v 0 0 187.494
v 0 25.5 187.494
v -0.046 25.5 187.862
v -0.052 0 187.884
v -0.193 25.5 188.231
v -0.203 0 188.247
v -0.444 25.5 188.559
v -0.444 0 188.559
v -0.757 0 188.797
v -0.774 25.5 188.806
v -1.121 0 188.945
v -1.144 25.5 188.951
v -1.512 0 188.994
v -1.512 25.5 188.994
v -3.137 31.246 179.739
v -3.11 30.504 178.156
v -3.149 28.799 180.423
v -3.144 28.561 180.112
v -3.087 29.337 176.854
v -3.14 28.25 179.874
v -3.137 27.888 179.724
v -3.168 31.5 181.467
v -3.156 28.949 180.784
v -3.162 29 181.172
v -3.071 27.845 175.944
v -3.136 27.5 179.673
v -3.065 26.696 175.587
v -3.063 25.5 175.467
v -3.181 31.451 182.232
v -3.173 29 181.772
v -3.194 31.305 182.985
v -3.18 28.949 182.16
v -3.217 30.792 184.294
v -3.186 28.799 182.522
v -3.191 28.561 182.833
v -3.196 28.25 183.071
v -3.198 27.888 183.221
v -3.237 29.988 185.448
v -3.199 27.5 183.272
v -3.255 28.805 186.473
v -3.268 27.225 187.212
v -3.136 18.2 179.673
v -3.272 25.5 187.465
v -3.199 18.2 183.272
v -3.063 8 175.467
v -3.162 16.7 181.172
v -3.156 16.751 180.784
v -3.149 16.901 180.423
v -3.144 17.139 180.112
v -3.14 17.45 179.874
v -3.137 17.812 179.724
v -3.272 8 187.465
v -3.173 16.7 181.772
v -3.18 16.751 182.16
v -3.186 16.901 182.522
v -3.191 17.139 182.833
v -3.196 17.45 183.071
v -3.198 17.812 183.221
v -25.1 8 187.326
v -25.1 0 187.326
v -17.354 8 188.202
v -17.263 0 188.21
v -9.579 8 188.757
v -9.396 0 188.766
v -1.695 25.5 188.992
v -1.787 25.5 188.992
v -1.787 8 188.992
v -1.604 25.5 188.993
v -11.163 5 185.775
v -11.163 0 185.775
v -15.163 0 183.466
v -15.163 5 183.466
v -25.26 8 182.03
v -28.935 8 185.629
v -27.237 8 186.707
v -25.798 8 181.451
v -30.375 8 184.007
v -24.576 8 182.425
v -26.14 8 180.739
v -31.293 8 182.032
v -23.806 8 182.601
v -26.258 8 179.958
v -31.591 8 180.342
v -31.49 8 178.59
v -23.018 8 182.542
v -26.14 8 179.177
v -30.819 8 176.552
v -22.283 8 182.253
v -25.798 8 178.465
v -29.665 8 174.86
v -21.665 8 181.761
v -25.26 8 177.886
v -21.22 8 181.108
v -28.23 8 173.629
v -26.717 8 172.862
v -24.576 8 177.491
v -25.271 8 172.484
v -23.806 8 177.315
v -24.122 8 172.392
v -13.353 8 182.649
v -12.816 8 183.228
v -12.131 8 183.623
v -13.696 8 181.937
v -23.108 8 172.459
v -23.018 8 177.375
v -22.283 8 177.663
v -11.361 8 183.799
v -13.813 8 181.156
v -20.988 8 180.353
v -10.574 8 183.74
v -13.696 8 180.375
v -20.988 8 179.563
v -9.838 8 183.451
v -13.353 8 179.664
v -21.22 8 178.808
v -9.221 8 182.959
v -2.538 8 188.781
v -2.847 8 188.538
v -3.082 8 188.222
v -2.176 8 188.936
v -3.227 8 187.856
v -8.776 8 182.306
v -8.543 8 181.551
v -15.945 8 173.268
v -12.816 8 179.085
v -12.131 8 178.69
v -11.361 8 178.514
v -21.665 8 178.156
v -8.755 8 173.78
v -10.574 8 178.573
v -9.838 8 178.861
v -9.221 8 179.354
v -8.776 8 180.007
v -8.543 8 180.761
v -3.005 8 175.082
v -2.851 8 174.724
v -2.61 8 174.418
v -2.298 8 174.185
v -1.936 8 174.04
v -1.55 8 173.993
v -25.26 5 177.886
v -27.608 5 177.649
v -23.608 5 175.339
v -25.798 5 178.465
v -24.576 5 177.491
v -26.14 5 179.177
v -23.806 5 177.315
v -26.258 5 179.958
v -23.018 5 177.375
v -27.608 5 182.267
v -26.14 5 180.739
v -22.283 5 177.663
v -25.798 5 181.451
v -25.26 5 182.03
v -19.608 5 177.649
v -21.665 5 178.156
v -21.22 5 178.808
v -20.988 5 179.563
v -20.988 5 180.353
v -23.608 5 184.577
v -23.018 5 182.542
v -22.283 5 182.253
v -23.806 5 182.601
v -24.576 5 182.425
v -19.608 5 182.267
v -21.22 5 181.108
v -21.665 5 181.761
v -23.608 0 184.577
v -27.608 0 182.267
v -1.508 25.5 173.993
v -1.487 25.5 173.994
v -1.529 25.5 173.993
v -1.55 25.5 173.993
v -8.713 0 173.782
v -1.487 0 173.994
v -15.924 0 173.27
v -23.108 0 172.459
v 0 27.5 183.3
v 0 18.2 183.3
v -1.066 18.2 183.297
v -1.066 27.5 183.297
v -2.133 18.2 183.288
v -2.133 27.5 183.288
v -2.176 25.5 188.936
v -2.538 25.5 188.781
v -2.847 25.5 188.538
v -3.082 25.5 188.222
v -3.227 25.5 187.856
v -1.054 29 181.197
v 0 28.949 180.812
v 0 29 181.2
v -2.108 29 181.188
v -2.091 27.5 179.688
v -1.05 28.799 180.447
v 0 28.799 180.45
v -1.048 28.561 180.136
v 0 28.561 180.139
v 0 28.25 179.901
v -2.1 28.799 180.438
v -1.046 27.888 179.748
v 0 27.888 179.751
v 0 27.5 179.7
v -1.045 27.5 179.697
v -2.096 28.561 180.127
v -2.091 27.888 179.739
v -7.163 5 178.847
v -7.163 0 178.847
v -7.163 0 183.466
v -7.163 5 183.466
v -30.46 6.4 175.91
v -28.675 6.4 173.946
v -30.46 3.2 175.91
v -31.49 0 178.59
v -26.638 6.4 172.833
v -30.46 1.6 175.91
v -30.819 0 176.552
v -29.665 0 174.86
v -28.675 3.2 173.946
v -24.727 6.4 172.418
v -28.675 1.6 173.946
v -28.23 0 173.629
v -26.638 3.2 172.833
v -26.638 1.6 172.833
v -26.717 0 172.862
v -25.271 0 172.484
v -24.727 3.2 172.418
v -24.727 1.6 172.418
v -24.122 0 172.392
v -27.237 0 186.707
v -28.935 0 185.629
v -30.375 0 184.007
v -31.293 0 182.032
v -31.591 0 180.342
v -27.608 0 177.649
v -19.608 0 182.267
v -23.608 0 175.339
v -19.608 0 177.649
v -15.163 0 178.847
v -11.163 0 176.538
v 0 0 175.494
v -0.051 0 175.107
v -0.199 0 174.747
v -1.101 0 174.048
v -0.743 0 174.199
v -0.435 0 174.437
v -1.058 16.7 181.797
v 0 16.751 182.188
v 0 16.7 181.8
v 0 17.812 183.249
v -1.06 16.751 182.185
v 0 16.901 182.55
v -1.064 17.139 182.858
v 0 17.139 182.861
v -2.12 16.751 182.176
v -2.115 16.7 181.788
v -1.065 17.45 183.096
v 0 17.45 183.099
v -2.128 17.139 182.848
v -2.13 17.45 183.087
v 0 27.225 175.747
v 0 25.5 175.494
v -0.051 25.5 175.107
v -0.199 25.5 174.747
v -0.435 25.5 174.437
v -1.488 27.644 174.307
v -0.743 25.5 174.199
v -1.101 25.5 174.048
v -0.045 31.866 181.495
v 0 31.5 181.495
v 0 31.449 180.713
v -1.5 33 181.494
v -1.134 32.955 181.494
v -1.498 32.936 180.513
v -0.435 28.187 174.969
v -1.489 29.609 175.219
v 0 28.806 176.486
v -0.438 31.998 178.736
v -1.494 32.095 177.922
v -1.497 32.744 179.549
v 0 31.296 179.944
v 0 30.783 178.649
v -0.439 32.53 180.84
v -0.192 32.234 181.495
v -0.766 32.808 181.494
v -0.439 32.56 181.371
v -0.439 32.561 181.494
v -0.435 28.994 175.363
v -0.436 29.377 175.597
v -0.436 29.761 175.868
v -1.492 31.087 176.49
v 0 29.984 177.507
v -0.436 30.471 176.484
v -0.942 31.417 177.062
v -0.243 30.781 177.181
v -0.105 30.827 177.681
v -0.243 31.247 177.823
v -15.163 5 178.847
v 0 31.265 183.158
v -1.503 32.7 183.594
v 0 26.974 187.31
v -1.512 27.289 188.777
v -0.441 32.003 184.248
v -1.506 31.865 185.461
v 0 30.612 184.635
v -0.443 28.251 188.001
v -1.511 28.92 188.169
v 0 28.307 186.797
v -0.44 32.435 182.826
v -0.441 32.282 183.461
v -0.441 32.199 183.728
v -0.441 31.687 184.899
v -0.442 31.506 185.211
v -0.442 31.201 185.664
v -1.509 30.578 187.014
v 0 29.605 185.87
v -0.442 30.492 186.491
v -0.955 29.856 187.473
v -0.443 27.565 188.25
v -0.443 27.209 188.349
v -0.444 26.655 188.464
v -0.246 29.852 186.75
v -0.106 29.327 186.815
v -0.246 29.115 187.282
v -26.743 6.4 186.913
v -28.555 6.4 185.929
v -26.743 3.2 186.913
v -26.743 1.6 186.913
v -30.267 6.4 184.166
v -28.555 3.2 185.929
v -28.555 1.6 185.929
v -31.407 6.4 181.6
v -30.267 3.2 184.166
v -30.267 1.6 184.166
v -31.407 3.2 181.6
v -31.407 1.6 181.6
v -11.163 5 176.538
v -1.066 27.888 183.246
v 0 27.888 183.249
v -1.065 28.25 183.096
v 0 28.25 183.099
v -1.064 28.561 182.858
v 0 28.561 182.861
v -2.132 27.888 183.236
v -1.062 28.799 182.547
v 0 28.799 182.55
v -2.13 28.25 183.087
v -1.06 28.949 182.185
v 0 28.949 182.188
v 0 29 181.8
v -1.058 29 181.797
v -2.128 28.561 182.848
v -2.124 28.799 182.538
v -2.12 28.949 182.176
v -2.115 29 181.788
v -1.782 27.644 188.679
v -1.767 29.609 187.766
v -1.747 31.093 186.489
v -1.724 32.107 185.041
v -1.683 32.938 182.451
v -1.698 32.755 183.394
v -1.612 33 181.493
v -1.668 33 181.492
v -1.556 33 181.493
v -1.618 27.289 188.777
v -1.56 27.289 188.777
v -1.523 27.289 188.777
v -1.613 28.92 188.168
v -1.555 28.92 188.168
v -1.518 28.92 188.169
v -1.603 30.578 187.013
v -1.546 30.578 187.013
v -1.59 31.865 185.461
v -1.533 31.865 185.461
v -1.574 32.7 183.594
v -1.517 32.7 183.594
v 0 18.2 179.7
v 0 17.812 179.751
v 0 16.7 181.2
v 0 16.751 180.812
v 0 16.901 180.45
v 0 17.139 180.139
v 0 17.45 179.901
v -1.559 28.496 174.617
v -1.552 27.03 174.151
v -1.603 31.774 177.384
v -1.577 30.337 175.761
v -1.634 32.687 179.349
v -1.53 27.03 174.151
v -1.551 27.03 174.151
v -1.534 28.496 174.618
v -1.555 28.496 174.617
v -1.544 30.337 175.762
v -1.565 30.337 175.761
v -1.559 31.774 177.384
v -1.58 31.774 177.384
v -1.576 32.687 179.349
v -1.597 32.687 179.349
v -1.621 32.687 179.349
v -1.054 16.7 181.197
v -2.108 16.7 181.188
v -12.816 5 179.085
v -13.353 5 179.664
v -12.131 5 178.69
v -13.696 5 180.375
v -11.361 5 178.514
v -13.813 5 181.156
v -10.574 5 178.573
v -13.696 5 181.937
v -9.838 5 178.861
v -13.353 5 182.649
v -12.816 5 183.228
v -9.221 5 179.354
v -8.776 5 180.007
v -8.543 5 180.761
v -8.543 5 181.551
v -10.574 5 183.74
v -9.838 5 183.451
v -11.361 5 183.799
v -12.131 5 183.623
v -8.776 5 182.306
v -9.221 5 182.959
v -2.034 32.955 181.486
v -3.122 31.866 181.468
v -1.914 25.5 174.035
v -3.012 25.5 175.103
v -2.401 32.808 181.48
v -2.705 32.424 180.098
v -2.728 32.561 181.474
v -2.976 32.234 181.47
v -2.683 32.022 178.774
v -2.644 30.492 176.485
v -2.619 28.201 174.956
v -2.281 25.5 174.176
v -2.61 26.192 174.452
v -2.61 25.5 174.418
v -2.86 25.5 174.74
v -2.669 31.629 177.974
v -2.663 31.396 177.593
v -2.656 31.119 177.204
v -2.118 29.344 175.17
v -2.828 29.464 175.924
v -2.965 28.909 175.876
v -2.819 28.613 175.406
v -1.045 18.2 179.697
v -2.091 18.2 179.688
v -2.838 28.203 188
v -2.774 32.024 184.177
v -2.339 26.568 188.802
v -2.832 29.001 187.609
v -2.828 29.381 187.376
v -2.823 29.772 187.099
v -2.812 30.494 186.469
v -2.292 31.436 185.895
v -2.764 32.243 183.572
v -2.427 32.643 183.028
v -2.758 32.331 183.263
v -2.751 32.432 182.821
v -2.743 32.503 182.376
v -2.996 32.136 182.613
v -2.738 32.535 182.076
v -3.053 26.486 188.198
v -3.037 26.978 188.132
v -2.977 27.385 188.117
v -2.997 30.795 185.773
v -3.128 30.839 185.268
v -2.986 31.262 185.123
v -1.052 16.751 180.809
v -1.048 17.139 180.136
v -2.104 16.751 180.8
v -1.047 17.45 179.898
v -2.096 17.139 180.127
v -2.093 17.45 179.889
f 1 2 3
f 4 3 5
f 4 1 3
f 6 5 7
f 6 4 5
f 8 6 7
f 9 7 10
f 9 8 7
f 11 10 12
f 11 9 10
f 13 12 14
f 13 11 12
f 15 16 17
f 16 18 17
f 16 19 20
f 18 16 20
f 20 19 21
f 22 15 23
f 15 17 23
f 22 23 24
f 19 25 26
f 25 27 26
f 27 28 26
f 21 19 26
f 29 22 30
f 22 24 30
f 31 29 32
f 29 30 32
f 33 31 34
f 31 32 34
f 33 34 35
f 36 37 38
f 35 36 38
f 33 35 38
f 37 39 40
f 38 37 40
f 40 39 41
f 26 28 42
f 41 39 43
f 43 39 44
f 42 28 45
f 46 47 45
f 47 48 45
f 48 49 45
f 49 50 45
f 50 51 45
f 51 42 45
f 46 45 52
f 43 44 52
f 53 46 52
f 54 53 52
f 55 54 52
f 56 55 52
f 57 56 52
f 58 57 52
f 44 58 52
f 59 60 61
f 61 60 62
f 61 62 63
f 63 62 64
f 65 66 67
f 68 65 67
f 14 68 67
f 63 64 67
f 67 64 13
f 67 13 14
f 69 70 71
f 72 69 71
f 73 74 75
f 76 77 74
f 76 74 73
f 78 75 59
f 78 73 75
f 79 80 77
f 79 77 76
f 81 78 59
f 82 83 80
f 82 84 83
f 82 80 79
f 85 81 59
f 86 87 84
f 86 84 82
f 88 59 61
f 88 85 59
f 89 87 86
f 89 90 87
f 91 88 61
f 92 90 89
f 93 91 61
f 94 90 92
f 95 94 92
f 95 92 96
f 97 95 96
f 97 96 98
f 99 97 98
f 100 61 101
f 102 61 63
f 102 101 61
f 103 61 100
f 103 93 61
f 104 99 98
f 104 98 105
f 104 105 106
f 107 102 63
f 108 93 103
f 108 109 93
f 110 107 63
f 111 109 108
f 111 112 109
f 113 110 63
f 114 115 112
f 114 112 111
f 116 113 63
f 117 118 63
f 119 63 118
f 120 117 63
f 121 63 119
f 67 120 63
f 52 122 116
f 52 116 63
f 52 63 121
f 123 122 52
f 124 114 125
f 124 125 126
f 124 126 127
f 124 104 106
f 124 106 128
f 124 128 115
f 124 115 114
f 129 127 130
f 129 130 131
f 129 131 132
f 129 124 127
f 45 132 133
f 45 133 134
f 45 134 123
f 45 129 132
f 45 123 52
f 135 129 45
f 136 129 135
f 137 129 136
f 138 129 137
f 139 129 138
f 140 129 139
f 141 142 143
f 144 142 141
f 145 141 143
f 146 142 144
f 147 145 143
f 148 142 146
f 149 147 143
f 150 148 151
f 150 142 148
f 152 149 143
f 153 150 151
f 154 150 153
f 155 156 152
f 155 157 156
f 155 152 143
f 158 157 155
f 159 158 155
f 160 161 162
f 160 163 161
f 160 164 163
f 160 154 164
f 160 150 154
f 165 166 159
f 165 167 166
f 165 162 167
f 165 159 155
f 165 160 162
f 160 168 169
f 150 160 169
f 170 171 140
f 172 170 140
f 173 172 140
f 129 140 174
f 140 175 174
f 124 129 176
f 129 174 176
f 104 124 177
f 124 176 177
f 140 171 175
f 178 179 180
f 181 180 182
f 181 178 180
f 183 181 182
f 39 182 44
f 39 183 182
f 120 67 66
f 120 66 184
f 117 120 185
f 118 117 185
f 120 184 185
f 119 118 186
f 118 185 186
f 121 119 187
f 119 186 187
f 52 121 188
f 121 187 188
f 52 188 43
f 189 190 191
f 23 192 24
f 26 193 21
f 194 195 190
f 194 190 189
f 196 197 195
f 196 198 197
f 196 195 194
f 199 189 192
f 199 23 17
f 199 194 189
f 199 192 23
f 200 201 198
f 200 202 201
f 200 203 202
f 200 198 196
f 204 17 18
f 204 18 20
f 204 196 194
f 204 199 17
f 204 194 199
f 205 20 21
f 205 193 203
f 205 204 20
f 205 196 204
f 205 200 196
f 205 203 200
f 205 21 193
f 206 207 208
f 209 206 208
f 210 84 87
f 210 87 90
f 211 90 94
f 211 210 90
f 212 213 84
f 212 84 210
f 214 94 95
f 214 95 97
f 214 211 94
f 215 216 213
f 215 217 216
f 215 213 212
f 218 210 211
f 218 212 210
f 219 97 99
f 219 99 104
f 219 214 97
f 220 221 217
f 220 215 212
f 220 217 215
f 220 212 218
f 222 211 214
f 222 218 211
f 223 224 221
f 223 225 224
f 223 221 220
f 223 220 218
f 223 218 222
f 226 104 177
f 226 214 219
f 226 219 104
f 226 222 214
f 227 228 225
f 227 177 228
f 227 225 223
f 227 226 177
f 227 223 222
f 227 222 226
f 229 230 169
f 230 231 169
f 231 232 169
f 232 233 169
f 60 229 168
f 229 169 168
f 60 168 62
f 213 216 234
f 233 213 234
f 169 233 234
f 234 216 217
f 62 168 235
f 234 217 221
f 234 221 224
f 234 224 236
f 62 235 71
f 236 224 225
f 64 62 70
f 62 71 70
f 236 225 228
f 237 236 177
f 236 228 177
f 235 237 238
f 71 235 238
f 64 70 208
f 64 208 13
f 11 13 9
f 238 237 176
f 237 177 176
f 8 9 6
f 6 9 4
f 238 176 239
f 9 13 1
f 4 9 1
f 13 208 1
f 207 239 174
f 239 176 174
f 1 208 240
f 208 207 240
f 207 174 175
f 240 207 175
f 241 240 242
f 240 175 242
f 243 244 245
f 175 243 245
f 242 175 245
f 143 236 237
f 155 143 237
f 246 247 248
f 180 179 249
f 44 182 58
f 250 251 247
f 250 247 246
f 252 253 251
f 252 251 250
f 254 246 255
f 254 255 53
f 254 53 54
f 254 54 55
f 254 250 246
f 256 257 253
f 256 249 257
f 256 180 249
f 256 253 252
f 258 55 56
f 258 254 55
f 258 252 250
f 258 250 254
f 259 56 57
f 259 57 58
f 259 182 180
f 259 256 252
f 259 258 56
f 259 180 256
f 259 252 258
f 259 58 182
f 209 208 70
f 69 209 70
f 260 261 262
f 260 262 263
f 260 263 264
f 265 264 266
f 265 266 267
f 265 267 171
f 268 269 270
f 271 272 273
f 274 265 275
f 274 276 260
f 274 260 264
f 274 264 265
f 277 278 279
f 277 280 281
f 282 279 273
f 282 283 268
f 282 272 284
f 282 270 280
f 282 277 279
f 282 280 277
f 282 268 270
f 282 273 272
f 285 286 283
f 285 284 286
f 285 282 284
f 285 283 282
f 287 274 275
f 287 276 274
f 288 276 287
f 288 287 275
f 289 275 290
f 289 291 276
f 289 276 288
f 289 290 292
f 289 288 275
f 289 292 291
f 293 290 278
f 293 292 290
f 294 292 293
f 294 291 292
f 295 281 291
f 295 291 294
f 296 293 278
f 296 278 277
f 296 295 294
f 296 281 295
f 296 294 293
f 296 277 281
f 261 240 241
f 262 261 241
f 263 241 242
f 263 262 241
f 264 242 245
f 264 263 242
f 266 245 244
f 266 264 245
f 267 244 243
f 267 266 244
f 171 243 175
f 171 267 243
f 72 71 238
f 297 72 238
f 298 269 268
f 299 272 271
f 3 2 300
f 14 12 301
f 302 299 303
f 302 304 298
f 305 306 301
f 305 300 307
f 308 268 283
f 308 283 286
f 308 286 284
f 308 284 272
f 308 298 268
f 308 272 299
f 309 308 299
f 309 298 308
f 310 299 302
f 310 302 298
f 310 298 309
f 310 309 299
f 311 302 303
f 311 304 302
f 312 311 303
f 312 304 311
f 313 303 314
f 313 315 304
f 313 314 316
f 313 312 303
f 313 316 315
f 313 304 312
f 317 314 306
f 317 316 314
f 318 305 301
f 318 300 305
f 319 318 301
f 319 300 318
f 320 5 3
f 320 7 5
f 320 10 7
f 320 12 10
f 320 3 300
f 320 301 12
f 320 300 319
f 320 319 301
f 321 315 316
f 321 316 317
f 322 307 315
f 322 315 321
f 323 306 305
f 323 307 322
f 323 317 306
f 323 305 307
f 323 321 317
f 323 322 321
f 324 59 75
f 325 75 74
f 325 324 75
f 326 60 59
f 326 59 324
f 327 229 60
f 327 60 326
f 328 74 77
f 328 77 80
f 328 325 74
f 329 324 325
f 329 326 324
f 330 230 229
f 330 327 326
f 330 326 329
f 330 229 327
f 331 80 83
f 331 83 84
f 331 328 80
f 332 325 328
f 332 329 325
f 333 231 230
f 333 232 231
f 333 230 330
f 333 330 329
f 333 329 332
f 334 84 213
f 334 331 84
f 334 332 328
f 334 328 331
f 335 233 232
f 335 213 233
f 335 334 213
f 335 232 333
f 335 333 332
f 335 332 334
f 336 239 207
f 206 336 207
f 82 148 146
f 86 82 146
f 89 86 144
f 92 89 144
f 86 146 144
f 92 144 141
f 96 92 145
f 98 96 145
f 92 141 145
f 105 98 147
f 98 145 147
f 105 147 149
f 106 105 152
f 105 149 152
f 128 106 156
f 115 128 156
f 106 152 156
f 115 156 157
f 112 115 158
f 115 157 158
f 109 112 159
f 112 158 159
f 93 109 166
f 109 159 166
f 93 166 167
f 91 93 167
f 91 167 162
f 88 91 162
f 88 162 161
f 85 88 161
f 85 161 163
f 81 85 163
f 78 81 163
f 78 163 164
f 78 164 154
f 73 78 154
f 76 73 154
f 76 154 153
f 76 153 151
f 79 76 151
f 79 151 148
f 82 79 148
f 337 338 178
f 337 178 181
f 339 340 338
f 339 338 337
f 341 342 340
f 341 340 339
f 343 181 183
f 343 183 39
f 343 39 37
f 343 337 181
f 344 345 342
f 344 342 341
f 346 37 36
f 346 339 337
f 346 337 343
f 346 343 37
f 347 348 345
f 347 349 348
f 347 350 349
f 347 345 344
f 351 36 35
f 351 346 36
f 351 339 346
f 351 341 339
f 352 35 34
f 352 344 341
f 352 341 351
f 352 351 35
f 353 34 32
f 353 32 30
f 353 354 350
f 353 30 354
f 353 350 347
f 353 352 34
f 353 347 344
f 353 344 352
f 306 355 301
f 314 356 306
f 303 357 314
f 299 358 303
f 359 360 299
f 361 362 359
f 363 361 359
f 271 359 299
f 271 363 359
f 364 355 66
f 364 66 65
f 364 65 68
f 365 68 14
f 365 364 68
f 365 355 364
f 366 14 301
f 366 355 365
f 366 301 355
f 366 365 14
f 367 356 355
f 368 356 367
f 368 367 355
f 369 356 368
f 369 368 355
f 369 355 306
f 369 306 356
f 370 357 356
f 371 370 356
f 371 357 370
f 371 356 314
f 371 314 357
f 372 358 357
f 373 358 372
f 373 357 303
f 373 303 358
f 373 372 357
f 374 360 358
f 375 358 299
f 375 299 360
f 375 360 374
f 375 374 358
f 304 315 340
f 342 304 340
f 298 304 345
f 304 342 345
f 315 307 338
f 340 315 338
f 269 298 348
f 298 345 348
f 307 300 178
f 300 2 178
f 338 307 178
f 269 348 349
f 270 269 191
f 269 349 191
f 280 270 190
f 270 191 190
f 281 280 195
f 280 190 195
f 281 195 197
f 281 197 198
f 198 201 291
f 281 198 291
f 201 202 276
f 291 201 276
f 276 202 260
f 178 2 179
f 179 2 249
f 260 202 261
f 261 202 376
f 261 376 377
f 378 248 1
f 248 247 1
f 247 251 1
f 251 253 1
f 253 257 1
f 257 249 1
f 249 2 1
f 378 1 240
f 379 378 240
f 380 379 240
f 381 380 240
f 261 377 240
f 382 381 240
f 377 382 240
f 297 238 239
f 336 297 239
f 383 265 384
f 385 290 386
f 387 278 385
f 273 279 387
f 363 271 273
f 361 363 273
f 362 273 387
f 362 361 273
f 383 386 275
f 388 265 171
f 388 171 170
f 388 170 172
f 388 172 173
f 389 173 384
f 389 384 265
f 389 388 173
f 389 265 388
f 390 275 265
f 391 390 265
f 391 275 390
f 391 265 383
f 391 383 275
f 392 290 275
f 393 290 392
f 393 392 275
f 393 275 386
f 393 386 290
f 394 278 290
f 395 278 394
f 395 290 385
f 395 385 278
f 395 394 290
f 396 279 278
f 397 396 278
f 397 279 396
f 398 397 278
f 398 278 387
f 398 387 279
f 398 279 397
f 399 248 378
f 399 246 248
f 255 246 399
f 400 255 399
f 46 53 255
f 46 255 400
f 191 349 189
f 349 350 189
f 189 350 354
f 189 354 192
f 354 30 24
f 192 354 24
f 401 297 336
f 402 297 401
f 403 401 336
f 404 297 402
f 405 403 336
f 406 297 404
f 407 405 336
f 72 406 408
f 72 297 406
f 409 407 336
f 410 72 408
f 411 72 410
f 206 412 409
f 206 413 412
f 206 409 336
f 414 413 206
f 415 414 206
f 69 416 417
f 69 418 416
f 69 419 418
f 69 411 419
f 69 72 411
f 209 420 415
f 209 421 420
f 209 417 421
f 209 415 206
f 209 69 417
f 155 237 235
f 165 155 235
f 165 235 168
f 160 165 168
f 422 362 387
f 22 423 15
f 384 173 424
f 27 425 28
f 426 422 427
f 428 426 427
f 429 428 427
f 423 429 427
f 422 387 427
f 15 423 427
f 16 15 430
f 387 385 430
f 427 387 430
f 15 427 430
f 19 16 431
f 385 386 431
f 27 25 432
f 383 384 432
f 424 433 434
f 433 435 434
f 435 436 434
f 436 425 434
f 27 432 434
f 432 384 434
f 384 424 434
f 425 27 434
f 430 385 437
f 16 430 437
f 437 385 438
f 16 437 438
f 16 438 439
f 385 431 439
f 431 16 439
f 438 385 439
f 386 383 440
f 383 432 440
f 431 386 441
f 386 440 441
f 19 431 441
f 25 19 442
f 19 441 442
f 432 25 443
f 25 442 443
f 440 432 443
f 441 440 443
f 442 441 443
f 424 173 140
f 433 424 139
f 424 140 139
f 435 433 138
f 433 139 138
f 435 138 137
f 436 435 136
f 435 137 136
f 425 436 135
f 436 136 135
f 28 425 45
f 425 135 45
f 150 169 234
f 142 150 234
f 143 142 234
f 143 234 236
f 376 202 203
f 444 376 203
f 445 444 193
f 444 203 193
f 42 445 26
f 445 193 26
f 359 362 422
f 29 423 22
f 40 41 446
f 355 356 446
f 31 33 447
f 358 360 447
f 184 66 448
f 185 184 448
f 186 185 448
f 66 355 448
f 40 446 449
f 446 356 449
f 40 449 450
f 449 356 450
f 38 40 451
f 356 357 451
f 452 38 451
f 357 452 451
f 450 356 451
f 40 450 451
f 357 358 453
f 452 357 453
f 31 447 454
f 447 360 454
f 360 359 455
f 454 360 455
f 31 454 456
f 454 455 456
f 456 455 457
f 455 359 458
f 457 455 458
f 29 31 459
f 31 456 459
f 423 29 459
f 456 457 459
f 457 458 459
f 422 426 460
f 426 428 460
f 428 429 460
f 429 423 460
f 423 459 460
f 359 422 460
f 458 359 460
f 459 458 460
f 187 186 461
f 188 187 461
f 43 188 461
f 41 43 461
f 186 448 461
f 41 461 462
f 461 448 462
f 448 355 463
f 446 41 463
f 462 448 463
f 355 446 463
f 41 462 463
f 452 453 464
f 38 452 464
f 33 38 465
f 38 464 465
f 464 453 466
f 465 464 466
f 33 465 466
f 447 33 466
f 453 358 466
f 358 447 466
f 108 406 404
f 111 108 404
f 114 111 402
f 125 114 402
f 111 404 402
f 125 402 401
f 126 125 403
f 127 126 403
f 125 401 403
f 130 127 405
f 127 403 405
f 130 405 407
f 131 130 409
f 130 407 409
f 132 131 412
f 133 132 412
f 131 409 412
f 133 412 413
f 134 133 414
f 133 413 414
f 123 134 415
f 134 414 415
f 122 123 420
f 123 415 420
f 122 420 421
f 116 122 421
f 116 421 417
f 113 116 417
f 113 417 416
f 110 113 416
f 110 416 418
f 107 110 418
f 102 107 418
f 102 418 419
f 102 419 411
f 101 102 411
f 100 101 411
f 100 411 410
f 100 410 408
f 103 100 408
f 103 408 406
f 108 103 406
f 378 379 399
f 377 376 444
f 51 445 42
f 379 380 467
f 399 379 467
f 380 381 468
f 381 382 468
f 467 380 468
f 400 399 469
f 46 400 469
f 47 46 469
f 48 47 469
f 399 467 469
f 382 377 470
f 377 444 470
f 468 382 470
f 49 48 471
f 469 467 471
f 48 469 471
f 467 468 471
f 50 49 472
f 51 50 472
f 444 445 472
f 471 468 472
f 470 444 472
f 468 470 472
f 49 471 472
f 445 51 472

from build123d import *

# Parameters (mm, degrees)
EXTRUDE_1_DEPTH     = 8
EXTRUDE_2_DEPTH     = 25
HOLE_WIZARD_M5_1_D  = 5.3
FILLET_1_R          = 7.5
FILLET_2_DEPTH      = 8
SKETCH_5_W          = 3.5999999999999943
SKETCH_5_H          = 12.29999999986595
FILLET_3_R          = 1.5
FILLET_4_R          = 1.5
CUT_EXTRUDE_1_DEPTH = 5


with BuildPart() as part:
    # 草图1 → 凸台-拉伸1 (new body)
    with BuildSketch(Plane(origin=(0, 0, 0), x_dir=(1, 0, 0), z_dir=(0, 1, 0))):
        with BuildLine():
            Line((2.098e-14, -189), (1.932e-14, -174.00000000000003))
            ThreePointArc((2.28618e-12, -174.00000000000003), (-15.165099238093463, -173.33787746796366), (-30.214782914050144, -171.35654902412347))
            Line((-30.214782914045937, -171.35654902412418), (-32.8195055790499, -186.12866531930732))
            ThreePointArc((-32.81950557905, -186.12866531930732), (-16.472435379307413, -188.28079793933995), (-3.472e-14, -189.00000000000003))
        make_face()
    extrude(amount=EXTRUDE_1_DEPTH)

    # 草图4 → 凸台-拉伸2 (add)
    with BuildSketch(Plane(origin=(0, 8, 0), x_dir=(1, 0, 0), z_dir=(0, 1, 0))):
        with BuildLine():
            Line((2.082e-14, -189), (1.916e-14, -174))
            ThreePointArc((-3.196e-14, -174.00000000000003), (-1.5184171767173116, -173.99337461316583), (-3.0367187200877925, -173.9734989572121))
            Line((-3.036718720087315, -173.97349895721206), (-3.298504816646567, -188.97121438455795))
            ThreePointArc((-3.2985048166465822, -188.971214384558), (-1.6493152091926062, -188.99280345912842), (-3.472e-14, -189.00000000000006))
        make_face()
    extrude(amount=EXTRUDE_2_DEPTH)

    # M5 间隙孔1 (through all)
    with Locations(Plane(origin=(0, 8, 0), x_dir=(1, 0, 0), z_dir=(0, 1, 0))):
        with Locations((-23.608051681, -179.958078162), (-11.163314825, -181.156370029)):
            Hole(HOLE_WIZARD_M5_1_D / 2)

    # 圆角1
    # the kernel refuses this fillet: 7.5 mm, written as the material it takes off along each edge
    with BuildSketch(Plane(origin=(1.47232e-12, 33, -1.0760459e-10), x_dir=(0.10755019962978496, 0, 0.9941996552803635), z_dir=(0.9941996552803635, 0, -0.10755019962978496))) as fillet_1_piece_1:
        with BuildLine():
            CenterArc((174.00000000010766 + FILLET_1_R, FILLET_1_R), FILLET_1_R, 180, 89.99999999999977)
            Line((174.00000000010766 + FILLET_1_R, 0), (174.00000000010766, 0))
            Line((174.00000000010766, 0), (174.00000000010766, FILLET_1_R))
        make_face()
    fillet_1_piece_1_solid = revolve(axis=Axis((1.47232e-12, 33, -1.0760459e-10), (0, -1, 0)), revolution_arc=13.348228955549553, mode=Mode.PRIVATE)
    with BuildSketch(Plane(origin=(2.05469e-12, 33, -2.9481839e-10), x_dir=(-0.11639521392683701, 0, 0.9932029773288671), z_dir=(-0.9932029773288671, 0, -0.11639521392683701))) as fillet_1_piece_2:
        with BuildLine():
            CenterArc((189.0000000002949 - FILLET_1_R, -FILLET_1_R), FILLET_1_R, 0, 89.99999999999957)
            Line((189.0000000002949 - FILLET_1_R, 0), (189.0000000002949, 0))
            Line((189.0000000002949, 0), (189.00000000029488, -FILLET_1_R))
        make_face()
    fillet_1_piece_2_solid = revolve(axis=Axis((2.05469e-12, 33, -2.9481839e-10), (0, 1, 0)), revolution_arc=12.368210784462358, mode=Mode.PRIVATE)
    add([fillet_1_piece_1_solid, fillet_1_piece_2_solid], mode=Mode.SUBTRACT)

    # 圆角2: read off the stored shape, not the designer's step
    # 圆角2 outline → 圆角2 (cut)
    with BuildSketch(Plane(origin=(0, 0, 0), x_dir=(1, 0, 0), z_dir=(0, 1, 0))):
        with BuildLine():
            ThreePointArc((-32.819505579, -186.128665319), (-28.966041771, -186.767150281), (-25.100206236, -187.325864863))
            add(Edge.make_bspline(
                [(-25.100206236, -187.325864863), (-27.006863278382305, -187.07038767754574), (-29.132080374521447, -186.17341393049847), (-31.048536919413714, -184.35464406978926), (-32.02623112721157, -181.62978297542463), (-31.490224503, -178.589937725)],
                knots=[0, 0, 0, 0, 0, 0, 0.5103349834155644, 0.5103349834155644, 0.5103349834155644, 0.5103349834155644, 0.5103349834155644, 0.5103349834155644], degree=5, weights=[1, 0.7958660065557144, 0.6438203721908997, 0.5438630969055563, 0.4959941806996843, 0.5002136235732837]))
            Line((-31.490224503, -178.589937725), (-32.819505579, -186.128665319))
        make_face()
        with BuildLine():
            Line((-30.214782914, -171.356549024), (-31.490224503, -178.589937725))
            add(Edge.make_bspline(
                [(-31.490224503, -178.589937725), (-30.984360135627078, -175.72103774319677), (-29.29551148466263, -173.58668082656104), (-27.075163325391554, -172.48015181385665), (-24.918748626576246, -172.21612345785414), (-23.108126376, -172.458732732)],
                knots=[0.5103349834155644, 0.5103349834155644, 0.5103349834155644, 0.5103349834155644, 0.5103349834155644, 0.5103349834155644, 1, 1, 1, 1, 1, 1], degree=5, weights=[0.5002136235732837, 0.5042621674352976, 0.5562650770089762, 0.6562223522943196, 0.8041339932913276, 1]))
            ThreePointArc((-23.108126376, -172.458732732), (-26.667149567, -171.944360576), (-30.214782914, -171.356549024))
        make_face()
    extrude(amount=FILLET_2_DEPTH, mode=Mode.SUBTRACT)

    # 草图5 → 切除-旋转1 (revolve, cut)
    with BuildSketch(Plane(origin=(0, 0, 0), x_dir=(-0.01745240643728342, 0, 0.9998476951563913), z_dir=(-0.9998476951563913, 0, -0.01745240643728342))):
        with Locations((181.5, 22.85000000006228)):
            Rectangle(SKETCH_5_W, SKETCH_5_H)
    revolve(axis=Axis((0, 55.00000000000001, 0), (0, -1, 0)), mode=Mode.SUBTRACT)

    # 圆角3
    fillet_3_edges = [part.edges().sort_by_distance(p)[0] for p in [
        (-1.5995739568519802, 28.999999999995254, 183.2930204976626),
        (-1.5995739568519802, 16.700000000129307, 183.2930204976626),
        (-1.5681584290578334, 16.700000000129307, 179.6931575746316),
        (-1.5681584290578334, 28.999999999995254, 179.6931575746316),
    ]]
    fillet(fillet_3_edges, radius=FILLET_3_R)

    # 圆角4
    fillet_4_edges = [part.edges().sort_by_distance(p)[0] for p in [
        (-8.43e-15, 12.75, 189.00000000000003),
        (-3.2985048166465747, 16.75, 188.97121438455798),
        (-3.0367187200875536, 16.75, 173.9734989572121),
        (7.049e-13, 12.75, 174.00000000000003),
        (-1.5838661929561955, 33, 181.4930890361471),
        (-1.5838661929561955, 33, 181.4930890361471),
    ]]
    fillet(fillet_4_edges, radius=FILLET_4_R)

    # 草图6 → 切除-拉伸1 (cut)
    with BuildSketch(Plane.XZ):
        Polygon((-23.608051681342314, 175.33927600862347), (-19.608051681342303, 177.648677085382), (-19.608051681342303, 182.267479238899), (-23.608051681342307, 184.5768803156575), (-27.608051681342282, 182.267479238899), (-27.608051681342282, 177.64867708538196), align=None)
        Polygon((-11.163314825368905, 176.53756787555398), (-7.163314825368916, 178.84696895231247), (-7.163314825368916, 183.4657711058294), (-11.163314825368891, 185.7751721825879), (-15.16331482536884, 183.46577110582942), (-15.16331482536884, 178.84696895231244), align=None)
    extrude(amount=-CUT_EXTRUDE_1_DEPTH, mode=Mode.SUBTRACT)


solid = part.part
